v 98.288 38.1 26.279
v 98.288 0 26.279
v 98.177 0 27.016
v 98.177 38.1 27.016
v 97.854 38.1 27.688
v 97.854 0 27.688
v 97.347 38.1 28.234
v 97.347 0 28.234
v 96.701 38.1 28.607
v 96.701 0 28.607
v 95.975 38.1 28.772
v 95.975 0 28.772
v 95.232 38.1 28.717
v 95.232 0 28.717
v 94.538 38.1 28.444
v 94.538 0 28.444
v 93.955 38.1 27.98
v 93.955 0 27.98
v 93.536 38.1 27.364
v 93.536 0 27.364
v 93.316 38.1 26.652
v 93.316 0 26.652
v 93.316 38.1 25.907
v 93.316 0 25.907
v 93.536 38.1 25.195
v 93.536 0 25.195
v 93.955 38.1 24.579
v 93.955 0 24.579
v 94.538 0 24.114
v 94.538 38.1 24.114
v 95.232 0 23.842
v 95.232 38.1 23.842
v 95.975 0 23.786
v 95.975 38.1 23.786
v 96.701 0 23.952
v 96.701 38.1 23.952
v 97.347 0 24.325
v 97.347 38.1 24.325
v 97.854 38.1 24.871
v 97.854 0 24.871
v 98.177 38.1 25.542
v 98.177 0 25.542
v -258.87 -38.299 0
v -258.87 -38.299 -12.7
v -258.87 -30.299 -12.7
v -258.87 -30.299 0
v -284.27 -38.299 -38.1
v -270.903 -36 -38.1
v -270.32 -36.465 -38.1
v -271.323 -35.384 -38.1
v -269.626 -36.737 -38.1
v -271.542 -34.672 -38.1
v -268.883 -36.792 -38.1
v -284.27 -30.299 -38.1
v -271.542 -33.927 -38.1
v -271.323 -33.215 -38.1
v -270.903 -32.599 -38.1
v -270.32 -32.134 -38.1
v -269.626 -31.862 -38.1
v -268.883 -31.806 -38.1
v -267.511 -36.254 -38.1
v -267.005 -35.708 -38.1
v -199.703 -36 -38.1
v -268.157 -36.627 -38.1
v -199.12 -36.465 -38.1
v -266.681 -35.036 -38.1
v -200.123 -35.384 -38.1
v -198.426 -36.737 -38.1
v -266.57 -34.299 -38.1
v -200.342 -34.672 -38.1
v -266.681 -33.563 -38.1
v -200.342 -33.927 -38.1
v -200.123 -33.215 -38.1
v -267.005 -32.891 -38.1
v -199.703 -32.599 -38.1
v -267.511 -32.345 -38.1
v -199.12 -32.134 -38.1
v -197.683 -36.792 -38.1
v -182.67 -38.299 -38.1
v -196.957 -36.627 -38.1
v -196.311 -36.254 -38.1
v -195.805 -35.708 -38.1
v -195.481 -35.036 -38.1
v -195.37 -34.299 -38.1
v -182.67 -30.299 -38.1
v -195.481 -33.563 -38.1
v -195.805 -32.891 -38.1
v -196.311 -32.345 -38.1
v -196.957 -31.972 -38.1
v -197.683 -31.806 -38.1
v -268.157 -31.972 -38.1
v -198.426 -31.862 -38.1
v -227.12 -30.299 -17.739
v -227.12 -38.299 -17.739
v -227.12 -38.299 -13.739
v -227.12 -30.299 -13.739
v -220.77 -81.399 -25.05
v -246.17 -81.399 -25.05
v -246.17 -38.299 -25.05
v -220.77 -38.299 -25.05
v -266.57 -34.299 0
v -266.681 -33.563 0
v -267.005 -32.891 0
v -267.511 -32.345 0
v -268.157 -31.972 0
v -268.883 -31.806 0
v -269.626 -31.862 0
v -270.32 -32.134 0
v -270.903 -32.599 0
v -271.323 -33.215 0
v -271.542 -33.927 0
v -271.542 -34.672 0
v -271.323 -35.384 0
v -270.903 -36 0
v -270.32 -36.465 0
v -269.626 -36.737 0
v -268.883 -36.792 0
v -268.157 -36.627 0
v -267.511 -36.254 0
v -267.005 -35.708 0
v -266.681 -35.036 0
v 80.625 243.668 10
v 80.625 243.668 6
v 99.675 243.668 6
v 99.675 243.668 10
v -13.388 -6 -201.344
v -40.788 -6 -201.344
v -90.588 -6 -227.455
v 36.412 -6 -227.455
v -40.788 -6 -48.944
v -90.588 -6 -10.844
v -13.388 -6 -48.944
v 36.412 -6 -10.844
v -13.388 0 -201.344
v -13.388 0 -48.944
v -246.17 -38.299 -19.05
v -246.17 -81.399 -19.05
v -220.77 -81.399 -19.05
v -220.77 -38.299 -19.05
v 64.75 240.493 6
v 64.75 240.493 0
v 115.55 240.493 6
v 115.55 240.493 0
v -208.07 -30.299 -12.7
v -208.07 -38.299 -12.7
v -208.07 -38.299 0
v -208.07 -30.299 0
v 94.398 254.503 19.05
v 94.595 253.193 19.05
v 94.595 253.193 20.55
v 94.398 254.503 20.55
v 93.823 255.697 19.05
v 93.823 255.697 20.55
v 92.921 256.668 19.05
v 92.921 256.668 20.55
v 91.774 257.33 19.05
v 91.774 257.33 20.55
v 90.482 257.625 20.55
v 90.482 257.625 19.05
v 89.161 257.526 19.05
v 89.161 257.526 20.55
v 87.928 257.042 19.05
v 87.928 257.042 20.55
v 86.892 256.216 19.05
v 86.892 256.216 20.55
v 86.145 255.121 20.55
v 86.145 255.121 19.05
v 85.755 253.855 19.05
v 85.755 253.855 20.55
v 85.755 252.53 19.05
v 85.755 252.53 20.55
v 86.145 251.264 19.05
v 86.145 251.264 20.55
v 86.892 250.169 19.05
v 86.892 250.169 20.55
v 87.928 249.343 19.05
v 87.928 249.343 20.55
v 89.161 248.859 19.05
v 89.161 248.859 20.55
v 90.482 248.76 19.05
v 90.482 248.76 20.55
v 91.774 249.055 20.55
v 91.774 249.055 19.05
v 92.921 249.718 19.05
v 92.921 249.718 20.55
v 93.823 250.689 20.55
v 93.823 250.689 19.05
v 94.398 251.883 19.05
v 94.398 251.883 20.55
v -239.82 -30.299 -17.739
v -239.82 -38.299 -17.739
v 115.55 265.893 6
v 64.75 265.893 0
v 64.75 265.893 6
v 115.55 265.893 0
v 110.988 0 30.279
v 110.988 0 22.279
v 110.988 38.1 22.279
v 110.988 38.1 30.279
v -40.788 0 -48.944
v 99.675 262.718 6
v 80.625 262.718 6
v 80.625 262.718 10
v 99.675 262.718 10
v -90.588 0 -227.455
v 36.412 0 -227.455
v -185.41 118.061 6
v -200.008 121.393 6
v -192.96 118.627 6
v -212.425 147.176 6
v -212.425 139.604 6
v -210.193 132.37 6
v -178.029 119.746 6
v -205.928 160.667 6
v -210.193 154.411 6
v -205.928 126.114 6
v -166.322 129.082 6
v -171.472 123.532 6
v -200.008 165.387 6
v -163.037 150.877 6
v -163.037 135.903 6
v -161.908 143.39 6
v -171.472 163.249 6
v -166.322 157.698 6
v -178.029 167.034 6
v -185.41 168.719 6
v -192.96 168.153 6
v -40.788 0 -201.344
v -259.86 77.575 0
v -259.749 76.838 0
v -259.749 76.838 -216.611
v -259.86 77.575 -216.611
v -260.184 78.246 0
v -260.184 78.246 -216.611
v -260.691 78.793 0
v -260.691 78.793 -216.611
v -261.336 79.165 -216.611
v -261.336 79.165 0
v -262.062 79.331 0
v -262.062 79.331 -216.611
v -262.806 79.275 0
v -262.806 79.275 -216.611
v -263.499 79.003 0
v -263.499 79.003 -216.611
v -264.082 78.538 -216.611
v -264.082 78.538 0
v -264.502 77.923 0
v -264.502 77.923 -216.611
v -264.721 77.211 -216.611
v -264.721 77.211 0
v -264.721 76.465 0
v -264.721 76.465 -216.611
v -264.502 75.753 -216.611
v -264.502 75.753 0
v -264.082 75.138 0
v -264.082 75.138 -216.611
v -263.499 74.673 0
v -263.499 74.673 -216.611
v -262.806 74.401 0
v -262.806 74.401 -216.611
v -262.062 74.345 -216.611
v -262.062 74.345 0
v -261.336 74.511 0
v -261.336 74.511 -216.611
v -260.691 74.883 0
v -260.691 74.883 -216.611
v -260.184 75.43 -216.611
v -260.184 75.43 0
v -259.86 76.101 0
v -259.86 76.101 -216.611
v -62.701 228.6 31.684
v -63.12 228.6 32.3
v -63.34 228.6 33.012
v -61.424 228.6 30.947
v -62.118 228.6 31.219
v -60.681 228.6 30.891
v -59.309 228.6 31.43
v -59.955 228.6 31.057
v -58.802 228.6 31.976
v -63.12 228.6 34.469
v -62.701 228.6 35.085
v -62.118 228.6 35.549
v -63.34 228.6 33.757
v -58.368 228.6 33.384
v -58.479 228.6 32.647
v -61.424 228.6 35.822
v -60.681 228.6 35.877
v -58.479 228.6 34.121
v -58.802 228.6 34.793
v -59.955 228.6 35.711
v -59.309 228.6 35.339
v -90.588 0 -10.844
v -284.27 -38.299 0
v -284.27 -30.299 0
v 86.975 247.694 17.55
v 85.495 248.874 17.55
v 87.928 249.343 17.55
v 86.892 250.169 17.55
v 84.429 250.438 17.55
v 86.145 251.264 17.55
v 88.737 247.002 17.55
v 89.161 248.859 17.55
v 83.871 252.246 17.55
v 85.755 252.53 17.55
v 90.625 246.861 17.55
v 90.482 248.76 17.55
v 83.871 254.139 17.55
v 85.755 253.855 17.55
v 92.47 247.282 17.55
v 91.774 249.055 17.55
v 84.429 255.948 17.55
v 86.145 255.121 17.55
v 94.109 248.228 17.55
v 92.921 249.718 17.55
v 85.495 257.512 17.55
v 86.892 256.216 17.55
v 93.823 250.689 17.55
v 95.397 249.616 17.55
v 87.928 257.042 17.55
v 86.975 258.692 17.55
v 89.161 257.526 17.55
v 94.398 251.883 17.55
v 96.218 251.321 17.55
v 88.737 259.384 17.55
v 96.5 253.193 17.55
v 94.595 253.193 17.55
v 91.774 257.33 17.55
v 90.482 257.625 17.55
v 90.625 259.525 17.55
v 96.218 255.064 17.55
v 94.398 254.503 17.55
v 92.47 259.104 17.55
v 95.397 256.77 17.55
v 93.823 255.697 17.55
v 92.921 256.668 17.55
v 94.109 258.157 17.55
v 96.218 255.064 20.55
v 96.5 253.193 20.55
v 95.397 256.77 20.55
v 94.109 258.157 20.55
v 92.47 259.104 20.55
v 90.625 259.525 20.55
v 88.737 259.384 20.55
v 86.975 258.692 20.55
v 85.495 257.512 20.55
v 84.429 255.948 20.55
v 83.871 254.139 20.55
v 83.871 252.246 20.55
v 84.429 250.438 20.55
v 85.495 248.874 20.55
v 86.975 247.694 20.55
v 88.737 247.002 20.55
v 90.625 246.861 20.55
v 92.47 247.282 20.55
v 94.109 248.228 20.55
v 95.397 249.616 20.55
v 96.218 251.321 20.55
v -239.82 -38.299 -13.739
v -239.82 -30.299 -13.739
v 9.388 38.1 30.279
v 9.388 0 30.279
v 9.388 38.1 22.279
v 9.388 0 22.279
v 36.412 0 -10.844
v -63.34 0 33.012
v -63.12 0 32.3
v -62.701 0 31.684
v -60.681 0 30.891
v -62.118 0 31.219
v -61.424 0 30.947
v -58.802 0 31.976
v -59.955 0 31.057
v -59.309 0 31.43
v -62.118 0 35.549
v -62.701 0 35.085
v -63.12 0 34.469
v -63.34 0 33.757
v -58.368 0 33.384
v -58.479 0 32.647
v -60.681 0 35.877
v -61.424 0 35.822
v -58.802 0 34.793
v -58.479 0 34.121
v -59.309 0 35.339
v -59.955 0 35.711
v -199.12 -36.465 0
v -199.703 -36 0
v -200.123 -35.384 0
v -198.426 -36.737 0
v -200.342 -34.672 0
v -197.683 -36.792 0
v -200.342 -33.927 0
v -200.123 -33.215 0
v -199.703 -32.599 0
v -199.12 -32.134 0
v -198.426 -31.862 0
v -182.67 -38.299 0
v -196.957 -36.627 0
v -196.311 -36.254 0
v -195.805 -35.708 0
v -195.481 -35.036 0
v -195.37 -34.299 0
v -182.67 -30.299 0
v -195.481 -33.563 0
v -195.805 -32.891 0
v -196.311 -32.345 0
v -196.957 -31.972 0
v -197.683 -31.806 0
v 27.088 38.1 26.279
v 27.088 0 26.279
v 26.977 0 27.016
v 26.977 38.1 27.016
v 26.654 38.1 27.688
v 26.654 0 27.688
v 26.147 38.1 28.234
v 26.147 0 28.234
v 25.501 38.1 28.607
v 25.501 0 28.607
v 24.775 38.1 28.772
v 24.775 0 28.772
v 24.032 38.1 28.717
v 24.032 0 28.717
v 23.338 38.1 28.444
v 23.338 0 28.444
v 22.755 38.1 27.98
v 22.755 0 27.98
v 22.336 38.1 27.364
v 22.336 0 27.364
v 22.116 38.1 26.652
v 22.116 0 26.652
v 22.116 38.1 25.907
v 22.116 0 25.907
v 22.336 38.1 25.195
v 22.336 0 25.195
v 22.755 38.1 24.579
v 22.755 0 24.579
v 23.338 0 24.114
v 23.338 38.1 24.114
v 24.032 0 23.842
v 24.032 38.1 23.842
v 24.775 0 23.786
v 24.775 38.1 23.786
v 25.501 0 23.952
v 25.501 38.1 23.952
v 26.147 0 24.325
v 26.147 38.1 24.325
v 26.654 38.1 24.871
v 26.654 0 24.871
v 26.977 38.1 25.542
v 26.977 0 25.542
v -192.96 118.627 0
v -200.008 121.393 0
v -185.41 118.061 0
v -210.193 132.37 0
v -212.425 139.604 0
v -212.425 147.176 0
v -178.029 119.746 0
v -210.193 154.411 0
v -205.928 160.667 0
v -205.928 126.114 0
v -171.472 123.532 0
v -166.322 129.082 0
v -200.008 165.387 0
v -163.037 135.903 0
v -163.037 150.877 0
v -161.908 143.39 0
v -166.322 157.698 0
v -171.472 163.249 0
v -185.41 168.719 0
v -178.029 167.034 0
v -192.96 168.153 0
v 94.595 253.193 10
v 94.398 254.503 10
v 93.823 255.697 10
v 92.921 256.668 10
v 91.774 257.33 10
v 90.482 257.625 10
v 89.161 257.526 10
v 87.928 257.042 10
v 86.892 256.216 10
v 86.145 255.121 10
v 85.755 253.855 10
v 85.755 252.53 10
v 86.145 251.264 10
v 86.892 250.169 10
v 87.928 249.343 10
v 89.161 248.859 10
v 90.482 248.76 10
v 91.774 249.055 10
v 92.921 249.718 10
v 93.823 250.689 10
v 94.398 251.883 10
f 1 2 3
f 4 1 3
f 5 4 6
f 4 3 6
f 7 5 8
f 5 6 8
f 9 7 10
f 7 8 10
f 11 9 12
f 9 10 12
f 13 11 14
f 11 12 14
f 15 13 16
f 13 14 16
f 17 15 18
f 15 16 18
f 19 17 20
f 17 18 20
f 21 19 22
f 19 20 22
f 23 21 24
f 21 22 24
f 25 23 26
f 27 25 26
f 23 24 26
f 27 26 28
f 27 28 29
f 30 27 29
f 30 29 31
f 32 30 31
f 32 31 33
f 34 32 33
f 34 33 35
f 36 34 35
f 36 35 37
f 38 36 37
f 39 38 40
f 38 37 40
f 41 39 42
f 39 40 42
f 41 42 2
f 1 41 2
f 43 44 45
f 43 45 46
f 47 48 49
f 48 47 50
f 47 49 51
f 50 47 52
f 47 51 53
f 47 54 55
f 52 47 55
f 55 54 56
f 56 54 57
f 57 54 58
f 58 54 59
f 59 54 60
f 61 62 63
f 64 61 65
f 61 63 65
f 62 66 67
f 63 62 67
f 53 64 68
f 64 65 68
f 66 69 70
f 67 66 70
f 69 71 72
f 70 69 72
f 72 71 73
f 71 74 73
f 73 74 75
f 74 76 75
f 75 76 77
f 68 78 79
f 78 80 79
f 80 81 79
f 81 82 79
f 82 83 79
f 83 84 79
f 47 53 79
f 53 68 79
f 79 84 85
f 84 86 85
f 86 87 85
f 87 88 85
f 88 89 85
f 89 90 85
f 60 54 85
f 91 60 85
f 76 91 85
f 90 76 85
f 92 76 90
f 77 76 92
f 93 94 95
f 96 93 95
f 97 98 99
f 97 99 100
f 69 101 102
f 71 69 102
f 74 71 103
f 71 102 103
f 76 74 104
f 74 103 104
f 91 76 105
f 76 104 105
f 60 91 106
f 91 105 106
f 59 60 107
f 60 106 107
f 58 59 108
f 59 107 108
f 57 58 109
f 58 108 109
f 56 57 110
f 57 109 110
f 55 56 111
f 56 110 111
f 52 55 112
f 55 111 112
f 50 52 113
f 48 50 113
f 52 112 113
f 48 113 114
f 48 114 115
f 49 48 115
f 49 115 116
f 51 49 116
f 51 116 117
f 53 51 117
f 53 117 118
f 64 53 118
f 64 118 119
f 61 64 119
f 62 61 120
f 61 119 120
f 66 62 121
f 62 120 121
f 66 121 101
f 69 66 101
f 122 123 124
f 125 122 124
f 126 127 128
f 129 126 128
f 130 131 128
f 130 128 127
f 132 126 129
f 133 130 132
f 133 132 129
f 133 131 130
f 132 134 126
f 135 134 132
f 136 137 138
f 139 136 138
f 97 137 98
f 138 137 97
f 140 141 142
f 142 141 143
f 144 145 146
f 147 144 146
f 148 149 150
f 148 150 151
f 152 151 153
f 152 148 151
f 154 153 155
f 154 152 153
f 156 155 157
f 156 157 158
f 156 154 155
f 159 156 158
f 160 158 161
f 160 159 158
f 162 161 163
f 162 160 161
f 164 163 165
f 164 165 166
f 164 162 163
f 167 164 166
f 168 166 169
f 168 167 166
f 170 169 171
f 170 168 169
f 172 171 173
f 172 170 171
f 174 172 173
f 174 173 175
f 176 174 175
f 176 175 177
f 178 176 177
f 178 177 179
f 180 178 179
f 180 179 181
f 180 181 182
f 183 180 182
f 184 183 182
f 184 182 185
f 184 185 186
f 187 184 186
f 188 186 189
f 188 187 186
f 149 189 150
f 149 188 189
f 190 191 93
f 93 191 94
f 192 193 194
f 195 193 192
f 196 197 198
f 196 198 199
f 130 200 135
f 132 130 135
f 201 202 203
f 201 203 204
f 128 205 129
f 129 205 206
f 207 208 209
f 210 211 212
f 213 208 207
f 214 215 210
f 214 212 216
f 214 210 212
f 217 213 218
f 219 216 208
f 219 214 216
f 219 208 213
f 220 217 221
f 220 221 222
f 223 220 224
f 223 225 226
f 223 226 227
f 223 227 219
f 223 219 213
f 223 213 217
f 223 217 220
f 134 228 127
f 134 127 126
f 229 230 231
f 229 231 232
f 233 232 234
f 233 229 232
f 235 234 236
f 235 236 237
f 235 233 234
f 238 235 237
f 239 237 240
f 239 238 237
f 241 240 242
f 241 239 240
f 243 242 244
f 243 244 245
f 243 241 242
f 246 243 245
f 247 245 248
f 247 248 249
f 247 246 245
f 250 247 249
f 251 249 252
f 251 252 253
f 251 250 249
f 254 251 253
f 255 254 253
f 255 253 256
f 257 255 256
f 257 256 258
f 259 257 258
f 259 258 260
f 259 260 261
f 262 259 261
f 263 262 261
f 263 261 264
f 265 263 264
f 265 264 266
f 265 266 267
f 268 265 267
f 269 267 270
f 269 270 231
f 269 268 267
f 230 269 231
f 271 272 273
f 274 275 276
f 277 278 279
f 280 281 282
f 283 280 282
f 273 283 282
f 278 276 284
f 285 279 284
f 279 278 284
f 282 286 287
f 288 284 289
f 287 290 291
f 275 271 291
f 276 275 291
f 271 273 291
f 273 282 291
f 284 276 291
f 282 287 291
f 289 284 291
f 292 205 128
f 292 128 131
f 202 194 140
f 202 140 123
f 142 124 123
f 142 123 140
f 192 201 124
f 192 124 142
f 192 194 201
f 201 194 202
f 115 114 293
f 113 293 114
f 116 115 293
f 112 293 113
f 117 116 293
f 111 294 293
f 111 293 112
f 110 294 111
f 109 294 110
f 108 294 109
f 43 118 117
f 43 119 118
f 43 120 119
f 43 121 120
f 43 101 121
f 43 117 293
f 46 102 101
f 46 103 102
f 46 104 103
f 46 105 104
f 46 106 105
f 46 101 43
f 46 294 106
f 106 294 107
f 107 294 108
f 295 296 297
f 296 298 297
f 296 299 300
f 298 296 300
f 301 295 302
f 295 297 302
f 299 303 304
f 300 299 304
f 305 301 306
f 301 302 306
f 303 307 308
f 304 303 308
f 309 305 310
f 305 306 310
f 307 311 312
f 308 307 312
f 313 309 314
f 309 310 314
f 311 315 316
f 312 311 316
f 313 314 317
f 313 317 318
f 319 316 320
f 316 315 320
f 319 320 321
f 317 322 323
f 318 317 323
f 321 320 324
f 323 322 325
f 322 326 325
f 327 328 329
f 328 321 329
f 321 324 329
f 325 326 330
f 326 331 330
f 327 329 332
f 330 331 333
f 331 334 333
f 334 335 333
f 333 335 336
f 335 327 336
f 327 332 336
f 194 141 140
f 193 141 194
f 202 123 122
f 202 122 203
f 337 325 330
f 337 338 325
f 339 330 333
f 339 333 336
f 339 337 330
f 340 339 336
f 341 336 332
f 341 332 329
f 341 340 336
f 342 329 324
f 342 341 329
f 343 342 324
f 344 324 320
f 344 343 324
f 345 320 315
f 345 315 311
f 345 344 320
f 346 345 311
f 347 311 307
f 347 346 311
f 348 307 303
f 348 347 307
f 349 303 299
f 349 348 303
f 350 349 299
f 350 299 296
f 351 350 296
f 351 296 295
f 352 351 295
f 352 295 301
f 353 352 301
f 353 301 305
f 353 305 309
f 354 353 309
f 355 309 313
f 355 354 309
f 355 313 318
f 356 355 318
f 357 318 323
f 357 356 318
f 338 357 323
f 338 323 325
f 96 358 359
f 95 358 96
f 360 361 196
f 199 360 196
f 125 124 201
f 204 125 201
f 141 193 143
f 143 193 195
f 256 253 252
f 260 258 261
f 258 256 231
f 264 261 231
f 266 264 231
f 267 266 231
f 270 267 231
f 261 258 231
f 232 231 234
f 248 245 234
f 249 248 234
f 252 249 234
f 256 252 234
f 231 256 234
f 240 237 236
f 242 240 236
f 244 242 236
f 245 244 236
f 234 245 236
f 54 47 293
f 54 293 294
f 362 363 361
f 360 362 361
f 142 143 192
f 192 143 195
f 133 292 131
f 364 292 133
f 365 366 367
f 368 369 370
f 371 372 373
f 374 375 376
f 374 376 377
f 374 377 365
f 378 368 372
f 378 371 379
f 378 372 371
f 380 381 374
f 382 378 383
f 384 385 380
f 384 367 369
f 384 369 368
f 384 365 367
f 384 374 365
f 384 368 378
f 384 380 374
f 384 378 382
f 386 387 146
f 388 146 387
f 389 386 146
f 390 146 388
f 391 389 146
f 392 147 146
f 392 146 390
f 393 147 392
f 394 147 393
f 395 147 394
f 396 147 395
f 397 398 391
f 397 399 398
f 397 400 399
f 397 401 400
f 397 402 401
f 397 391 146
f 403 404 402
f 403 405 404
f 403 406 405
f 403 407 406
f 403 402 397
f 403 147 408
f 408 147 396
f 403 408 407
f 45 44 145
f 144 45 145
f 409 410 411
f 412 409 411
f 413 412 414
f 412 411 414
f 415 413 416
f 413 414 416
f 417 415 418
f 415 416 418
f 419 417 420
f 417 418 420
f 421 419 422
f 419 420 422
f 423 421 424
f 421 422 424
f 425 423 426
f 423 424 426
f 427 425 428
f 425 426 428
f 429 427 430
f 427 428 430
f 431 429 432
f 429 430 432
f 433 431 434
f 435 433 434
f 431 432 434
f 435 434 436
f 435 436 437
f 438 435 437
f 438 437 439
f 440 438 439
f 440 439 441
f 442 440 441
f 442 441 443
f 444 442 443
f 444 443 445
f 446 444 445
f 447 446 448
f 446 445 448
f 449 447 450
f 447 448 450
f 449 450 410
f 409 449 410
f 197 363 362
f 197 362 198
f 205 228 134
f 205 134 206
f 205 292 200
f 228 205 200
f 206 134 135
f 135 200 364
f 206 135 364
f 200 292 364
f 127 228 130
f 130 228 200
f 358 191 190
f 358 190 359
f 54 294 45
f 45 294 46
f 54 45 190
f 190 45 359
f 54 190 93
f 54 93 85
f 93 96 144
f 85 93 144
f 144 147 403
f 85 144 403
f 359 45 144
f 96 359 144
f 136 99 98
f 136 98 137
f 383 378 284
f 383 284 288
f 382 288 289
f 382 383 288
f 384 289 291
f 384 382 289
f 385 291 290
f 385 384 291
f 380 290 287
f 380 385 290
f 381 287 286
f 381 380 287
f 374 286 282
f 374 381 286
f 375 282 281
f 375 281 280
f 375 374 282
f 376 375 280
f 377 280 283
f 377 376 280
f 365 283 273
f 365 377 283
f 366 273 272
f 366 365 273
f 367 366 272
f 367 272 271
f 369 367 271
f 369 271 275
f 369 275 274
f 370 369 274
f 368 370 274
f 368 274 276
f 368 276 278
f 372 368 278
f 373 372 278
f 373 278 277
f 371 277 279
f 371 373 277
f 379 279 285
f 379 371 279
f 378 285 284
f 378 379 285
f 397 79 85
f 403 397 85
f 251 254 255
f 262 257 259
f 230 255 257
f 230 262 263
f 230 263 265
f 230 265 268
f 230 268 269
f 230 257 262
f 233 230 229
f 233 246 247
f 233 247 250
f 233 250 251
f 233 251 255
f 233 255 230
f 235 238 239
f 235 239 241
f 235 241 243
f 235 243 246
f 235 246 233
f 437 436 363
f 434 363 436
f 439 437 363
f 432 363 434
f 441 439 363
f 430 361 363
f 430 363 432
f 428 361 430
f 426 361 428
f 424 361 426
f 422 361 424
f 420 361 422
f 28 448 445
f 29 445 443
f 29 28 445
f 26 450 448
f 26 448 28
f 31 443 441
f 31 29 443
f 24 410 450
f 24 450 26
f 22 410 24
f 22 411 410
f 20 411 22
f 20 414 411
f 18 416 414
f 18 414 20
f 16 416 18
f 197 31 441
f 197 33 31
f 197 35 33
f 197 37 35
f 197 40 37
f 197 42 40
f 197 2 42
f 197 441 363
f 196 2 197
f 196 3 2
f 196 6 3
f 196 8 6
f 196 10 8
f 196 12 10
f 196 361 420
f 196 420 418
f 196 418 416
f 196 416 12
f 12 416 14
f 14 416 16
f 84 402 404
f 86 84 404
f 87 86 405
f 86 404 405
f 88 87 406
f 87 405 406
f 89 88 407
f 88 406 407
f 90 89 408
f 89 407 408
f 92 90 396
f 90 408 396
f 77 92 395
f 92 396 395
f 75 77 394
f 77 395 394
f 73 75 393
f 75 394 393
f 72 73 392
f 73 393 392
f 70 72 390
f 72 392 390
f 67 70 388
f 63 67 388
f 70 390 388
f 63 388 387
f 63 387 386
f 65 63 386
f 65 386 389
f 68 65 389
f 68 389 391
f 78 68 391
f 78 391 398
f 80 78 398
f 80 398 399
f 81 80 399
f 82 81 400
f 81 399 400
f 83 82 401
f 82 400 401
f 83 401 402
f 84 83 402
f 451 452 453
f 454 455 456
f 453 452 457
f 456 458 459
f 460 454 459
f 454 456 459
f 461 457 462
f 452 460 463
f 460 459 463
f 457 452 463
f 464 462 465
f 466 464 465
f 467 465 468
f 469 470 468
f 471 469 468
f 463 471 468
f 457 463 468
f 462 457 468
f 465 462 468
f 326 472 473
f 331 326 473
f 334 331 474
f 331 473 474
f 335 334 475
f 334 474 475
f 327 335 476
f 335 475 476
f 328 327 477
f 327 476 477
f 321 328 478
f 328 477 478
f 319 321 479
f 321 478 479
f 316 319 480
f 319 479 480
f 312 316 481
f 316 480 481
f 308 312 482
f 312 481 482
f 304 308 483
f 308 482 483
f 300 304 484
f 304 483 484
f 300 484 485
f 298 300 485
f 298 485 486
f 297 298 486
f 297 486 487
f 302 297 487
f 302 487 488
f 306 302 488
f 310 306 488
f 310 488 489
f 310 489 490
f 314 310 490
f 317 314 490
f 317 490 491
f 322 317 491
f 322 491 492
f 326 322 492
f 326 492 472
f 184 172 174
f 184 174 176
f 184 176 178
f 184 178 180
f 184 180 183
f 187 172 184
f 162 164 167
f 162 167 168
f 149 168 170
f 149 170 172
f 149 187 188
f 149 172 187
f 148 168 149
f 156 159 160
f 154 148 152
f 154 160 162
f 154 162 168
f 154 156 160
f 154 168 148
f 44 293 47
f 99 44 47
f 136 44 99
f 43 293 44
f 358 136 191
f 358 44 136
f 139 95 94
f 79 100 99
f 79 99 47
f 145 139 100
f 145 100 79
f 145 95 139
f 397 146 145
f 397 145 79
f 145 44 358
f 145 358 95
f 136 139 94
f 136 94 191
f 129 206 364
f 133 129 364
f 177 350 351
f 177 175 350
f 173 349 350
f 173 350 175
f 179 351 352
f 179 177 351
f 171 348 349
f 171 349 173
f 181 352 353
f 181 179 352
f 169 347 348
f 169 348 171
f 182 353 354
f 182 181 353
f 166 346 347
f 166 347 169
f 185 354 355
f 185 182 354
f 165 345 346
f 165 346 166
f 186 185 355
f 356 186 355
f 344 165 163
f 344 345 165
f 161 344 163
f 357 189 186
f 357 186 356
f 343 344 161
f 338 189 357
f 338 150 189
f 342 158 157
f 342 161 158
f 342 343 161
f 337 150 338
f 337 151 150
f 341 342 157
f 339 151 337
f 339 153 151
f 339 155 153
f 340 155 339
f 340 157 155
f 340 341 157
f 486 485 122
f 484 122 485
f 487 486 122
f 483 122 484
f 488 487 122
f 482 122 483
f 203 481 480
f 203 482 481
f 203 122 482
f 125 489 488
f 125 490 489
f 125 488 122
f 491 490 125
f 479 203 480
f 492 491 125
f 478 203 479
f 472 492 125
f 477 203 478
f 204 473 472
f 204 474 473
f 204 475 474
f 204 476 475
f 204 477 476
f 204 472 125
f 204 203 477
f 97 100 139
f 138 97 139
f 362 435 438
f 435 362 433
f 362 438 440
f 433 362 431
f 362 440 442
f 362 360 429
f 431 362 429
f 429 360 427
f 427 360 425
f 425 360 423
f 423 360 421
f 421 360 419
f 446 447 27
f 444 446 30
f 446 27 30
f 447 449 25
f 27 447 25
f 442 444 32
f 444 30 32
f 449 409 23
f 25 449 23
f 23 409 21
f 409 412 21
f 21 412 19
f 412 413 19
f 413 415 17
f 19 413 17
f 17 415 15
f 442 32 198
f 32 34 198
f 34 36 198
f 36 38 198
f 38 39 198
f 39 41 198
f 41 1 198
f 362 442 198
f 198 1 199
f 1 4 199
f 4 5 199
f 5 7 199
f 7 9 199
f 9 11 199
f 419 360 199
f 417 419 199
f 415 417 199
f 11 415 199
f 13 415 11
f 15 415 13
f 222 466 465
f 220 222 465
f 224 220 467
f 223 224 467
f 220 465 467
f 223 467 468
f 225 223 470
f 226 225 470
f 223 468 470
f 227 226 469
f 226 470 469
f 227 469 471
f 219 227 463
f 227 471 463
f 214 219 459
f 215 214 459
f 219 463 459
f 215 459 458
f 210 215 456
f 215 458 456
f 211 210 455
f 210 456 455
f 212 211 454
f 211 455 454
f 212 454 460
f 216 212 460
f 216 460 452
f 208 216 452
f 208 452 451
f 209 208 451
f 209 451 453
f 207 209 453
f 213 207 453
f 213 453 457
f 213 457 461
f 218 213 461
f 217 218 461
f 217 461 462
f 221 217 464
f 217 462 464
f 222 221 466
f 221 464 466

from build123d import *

# Parameters (mm, degrees)
F1_R      = 2.5
F2_DEPTH  = 228.6
F0_W      = 101.6
F0_H      = 8
F0_R      = 2.5
F3_DEPTH  = 38.1
F4_W      = 101.6
F4_H      = 8
F4_R      = 2.5
F5_DEPTH  = 38.1
F6_R      = 2.5
F7_DEPTH  = 216.6112
F8_W      = 127
F8_H      = 216.6112
F8_W_2    = 27.4
F8_H_2    = 152.4
F9_DEPTH  = 6
F10_R     = 25.4
F11_DEPTH = 6
F12_W     = 50.8
F12_H     = 25.4
F12_W_2   = 19.05
F12_H_2   = 19.05
F12_R     = 4.445
F13_DEPTH = 6
F14_DEPTH = 10
F15_DEPTH = 19.05
F16_R     = 6.35
F16_R_2   = 4.445
F17_DEPTH = 1.5
F18_W     = 50.8
F18_H     = 12.7
F18_W_2   = 12.7
F18_H_2   = 4
F19_DEPTH = 8
F18_W_3   = 25.4
F18_H_3   = 6
F20_DEPTH = 43.1


with BuildPart() as f2:
    # F1 (on Front) → F2 (new body)
    with BuildSketch(Plane.XZ):
        with Locations((-60.868055, 33.384308)):
            Circle(F1_R)
    extrude(amount=-F2_DEPTH)


with BuildPart() as f3:
    # F0 (on Front) → F3 (new body)
    with BuildSketch(Plane.XZ):
        with Locations((60.187948, 26.279371)):
            Rectangle(F0_W, F0_H)
        with Locations((24.587948, 26.279371)):
            Circle(F0_R, mode=Mode.SUBTRACT)
        with Locations((95.787948, 26.279371)):
            Circle(F0_R, mode=Mode.SUBTRACT)
    extrude(amount=-F3_DEPTH)


with BuildPart() as f5:
    # F4 (on Top) → F5 (new body)
    with BuildSketch(Plane.XY):
        with Locations((-233.470182, -34.29946)):
            Rectangle(F4_W, F4_H)
        with Locations((-269.070182, -34.29946)):
            Circle(F4_R, mode=Mode.SUBTRACT)
        with Locations((-197.870182, -34.29946)):
            Circle(F4_R, mode=Mode.SUBTRACT)
    extrude(amount=-F5_DEPTH)

    # F18 (on face) → F19 (cut)
    with BuildSketch(Plane.XZ.offset(38.29946)):
        with Locations((-233.470182, -6.35)):
            Rectangle(F18_W, F18_H)
        with Locations((-233.470182, -15.739394)):
            Rectangle(F18_W_2, F18_H_2)
    extrude(amount=-F19_DEPTH, mode=Mode.SUBTRACT)

    # F18 (on face) → F20 (join)
    with BuildSketch(Plane.XZ.offset(38.29946)):
        with Locations((-233.470182, -22.05)):
            Rectangle(F18_W_3, F18_H_3)
    extrude(amount=F20_DEPTH)


with BuildPart() as f7:
    # F6 (on Top) → F7 (new body)
    with BuildSketch(Plane.XY):
        with Locations((-262.249321, 76.838002)):
            Circle(F6_R)
    extrude(amount=-F7_DEPTH)


with BuildPart() as f9:
    # F8 (on Front) → F9 (new body)
    with BuildSketch(Plane.XZ):
        with Locations((-27.088191, -119.149464)):
            Rectangle(F8_W, F8_H)
        with Locations((-27.088191, -125.143864)):
            Rectangle(F8_W_2, F8_H_2, mode=Mode.SUBTRACT)
    extrude(amount=F9_DEPTH)


with BuildPart() as f11:
    # F10 (on Top) → F11 (new body)
    with BuildSketch(Plane.XY):
        with Locations((-187.308237, 143.390164)):
            Circle(F10_R)
    extrude(amount=F11_DEPTH)


with BuildPart() as f13:
    # F12 (on Top) → F13 (new body)
    with BuildSketch(Plane.XY):
        with Locations((90.150028, 253.192764)):
            Rectangle(F12_W, F12_H)
        with Locations((90.150028, 253.192764)):
            Rectangle(F12_W_2, F12_H_2, mode=Mode.SUBTRACT)
        with Locations((90.150028, 253.192764)):
            Rectangle(F12_W_2, F12_H_2)
        with Locations((90.150028, 253.192764)):
            Circle(F12_R, mode=Mode.SUBTRACT)
        with Locations((90.150028, 253.192764)):
            Circle(F12_R)
    extrude(amount=F13_DEPTH)

    # F12 (on Top) → F14 (join)
    with BuildSketch(Plane.XY):
        with Locations((90.150028, 253.192764)):
            Rectangle(F12_W_2, F12_H_2)
        with Locations((90.150028, 253.192764)):
            Circle(F12_R, mode=Mode.SUBTRACT)
    extrude(amount=F14_DEPTH)

    # F12 (on Top) → F15 (join)
    with BuildSketch(Plane.XY):
        with Locations((90.150028, 253.192764)):
            Circle(F12_R)
    extrude(amount=F15_DEPTH)

    # F16 (on face) → F17 (join, symmetric)
    with BuildSketch(Plane.XY.offset(19.05)):
        with Locations((90.150028, 253.192764)):
            Circle(F16_R)
        with Locations((90.150028, 253.192764)):
            Circle(F16_R_2, mode=Mode.SUBTRACT)
    extrude(amount=F17_DEPTH, both=True)


solid = Compound([f2.part, f3.part, f5.part, f7.part, f9.part, f11.part, f13.part])
